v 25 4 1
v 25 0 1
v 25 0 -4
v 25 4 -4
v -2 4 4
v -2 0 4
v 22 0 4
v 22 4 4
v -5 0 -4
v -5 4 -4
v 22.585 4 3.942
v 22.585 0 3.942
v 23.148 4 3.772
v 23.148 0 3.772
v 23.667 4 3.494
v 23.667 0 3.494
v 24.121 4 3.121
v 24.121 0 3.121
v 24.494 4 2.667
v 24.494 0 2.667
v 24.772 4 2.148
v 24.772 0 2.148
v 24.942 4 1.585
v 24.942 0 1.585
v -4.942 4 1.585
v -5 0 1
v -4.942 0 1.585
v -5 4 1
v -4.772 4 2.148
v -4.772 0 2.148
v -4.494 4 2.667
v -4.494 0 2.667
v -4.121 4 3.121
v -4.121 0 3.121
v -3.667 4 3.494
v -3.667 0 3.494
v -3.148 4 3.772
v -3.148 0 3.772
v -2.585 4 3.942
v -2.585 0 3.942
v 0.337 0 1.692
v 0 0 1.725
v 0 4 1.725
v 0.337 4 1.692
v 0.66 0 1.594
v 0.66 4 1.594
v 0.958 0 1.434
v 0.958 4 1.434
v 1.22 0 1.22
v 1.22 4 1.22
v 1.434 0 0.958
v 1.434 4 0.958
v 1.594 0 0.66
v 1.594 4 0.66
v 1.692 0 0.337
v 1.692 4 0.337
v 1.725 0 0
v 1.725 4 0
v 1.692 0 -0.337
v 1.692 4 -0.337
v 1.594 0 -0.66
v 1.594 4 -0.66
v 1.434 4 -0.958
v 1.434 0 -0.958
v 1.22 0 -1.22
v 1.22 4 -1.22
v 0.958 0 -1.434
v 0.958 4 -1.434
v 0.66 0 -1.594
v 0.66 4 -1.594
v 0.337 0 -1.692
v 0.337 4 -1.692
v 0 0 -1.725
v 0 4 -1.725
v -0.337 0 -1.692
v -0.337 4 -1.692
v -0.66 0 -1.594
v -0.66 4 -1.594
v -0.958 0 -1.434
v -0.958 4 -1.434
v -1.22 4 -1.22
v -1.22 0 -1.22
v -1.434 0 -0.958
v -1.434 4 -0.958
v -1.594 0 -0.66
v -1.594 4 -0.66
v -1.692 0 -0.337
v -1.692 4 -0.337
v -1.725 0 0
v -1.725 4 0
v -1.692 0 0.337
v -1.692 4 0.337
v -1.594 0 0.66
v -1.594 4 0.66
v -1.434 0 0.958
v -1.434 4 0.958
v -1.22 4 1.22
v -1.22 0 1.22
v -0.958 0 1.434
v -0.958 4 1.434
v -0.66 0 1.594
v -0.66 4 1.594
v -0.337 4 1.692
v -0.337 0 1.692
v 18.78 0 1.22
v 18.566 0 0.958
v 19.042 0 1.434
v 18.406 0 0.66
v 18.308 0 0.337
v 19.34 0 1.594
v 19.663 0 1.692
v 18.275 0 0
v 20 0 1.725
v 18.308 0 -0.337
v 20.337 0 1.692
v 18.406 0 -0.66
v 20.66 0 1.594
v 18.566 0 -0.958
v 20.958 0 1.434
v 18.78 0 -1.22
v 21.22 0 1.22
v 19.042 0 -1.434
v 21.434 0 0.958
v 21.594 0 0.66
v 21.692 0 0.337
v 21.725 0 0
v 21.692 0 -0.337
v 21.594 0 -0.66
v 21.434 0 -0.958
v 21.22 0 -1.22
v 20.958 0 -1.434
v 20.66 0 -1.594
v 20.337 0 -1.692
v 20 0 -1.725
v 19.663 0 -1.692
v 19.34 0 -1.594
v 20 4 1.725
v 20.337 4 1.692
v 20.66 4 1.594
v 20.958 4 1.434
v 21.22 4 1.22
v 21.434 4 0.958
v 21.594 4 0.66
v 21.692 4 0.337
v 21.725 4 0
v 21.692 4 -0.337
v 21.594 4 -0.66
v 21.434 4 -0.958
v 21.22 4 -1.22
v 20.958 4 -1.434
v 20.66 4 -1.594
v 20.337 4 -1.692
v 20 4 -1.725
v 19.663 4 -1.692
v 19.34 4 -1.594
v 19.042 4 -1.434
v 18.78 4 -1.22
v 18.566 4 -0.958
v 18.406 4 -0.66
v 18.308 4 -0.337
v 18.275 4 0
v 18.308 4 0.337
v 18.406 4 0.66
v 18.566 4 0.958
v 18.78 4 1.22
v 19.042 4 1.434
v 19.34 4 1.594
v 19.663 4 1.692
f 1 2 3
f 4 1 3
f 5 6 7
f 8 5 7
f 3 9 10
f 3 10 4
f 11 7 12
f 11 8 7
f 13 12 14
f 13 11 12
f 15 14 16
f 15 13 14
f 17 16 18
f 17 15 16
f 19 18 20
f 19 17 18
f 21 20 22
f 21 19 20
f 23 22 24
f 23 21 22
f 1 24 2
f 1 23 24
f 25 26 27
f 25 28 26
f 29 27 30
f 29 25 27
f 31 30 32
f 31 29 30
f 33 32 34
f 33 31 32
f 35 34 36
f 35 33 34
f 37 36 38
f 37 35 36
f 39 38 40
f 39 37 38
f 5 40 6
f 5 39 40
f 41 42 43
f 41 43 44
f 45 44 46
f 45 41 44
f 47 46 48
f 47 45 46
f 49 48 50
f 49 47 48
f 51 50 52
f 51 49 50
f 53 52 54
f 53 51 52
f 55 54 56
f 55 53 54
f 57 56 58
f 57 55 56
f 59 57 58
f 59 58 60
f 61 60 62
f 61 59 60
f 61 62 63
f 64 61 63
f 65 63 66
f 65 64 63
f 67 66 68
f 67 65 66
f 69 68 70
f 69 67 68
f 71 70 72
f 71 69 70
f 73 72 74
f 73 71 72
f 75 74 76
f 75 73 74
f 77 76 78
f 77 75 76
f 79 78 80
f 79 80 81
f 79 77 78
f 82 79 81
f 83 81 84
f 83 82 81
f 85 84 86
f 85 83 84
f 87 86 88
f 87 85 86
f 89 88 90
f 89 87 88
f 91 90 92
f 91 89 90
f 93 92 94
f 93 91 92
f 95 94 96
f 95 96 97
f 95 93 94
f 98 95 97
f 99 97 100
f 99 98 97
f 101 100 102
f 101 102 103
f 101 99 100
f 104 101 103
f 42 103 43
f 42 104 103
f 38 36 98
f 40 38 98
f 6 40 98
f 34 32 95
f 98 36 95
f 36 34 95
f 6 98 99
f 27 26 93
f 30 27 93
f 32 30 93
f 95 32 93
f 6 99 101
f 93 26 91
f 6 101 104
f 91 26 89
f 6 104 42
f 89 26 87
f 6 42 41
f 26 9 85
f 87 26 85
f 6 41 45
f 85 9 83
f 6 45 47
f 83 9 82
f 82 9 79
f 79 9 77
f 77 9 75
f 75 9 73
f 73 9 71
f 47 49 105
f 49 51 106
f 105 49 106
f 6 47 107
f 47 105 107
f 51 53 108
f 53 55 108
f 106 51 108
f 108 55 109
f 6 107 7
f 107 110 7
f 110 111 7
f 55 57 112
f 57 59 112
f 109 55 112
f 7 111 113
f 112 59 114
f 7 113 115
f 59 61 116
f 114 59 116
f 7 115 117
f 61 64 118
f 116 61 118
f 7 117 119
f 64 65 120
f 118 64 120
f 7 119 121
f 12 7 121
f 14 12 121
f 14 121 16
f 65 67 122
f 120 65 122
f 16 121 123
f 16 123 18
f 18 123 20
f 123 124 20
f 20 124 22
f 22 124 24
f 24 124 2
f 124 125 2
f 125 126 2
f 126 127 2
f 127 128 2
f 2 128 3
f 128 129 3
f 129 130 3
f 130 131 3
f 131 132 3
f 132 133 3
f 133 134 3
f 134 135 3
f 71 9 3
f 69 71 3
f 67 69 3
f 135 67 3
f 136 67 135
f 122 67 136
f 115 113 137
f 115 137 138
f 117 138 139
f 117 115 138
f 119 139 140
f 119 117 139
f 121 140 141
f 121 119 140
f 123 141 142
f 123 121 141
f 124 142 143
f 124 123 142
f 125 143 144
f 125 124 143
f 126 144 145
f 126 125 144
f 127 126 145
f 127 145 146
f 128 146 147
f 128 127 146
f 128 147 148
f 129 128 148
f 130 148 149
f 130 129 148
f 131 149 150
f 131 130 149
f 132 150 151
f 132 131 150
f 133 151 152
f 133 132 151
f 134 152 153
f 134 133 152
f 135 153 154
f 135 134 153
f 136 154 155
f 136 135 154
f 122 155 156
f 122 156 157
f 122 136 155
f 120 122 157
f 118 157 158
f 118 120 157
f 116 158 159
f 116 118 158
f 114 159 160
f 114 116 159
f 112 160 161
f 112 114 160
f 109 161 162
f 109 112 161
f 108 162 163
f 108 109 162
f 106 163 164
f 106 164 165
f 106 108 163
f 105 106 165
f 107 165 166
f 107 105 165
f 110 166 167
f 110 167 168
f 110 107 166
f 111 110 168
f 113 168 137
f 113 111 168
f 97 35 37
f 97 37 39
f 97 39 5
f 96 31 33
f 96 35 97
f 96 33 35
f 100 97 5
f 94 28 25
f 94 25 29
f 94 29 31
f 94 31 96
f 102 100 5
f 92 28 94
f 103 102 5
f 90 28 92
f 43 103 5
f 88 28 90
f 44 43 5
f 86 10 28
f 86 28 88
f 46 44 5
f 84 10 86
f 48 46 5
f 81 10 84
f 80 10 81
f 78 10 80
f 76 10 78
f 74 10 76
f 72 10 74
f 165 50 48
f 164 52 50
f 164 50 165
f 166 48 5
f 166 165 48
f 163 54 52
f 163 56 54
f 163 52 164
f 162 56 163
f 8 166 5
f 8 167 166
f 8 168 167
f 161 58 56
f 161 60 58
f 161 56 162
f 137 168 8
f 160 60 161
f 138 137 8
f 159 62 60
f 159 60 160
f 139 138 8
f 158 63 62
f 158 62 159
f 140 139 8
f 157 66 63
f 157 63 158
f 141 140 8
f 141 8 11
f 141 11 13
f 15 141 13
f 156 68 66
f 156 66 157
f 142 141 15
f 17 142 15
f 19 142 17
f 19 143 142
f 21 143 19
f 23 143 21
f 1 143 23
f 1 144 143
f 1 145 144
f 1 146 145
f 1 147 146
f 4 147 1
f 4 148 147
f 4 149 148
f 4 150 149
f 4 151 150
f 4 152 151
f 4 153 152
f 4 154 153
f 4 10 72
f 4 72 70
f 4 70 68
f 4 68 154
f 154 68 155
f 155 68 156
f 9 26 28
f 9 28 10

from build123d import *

# Parameters (mm, degrees)
SKETCH1_W           = 30
SKETCH1_H           = 8
SKETCH1_R           = 1.725
BOSS_EXTRUDE1_DEPTH = 4
FILLET1_R           = 3


with BuildPart() as part:
    # Sketch1 → Boss-Extrude1 (new body)
    with BuildSketch(Plane(origin=(0, 0, 0), x_dir=(1, 0, 0), z_dir=(0, 1, 0))):
        with Locations((10, 0)):
            Rectangle(SKETCH1_W, SKETCH1_H)
        with Locations(Location((0, 0, 0), (0, 0, 270))):
            Circle(SKETCH1_R, mode=Mode.SUBTRACT)
        with Locations(Location((20, 0, 0), (0, 0, 270))):
            Circle(SKETCH1_R, mode=Mode.SUBTRACT)
    extrude(amount=BOSS_EXTRUDE1_DEPTH)

    # Fillet1
    fillet1_edges = [part.edges().sort_by_distance(p)[0] for p in [
        (25, 2, 4),
        (-5, 2, 4),
    ]]
    fillet(fillet1_edges, radius=FILLET1_R)


solid = part.part
